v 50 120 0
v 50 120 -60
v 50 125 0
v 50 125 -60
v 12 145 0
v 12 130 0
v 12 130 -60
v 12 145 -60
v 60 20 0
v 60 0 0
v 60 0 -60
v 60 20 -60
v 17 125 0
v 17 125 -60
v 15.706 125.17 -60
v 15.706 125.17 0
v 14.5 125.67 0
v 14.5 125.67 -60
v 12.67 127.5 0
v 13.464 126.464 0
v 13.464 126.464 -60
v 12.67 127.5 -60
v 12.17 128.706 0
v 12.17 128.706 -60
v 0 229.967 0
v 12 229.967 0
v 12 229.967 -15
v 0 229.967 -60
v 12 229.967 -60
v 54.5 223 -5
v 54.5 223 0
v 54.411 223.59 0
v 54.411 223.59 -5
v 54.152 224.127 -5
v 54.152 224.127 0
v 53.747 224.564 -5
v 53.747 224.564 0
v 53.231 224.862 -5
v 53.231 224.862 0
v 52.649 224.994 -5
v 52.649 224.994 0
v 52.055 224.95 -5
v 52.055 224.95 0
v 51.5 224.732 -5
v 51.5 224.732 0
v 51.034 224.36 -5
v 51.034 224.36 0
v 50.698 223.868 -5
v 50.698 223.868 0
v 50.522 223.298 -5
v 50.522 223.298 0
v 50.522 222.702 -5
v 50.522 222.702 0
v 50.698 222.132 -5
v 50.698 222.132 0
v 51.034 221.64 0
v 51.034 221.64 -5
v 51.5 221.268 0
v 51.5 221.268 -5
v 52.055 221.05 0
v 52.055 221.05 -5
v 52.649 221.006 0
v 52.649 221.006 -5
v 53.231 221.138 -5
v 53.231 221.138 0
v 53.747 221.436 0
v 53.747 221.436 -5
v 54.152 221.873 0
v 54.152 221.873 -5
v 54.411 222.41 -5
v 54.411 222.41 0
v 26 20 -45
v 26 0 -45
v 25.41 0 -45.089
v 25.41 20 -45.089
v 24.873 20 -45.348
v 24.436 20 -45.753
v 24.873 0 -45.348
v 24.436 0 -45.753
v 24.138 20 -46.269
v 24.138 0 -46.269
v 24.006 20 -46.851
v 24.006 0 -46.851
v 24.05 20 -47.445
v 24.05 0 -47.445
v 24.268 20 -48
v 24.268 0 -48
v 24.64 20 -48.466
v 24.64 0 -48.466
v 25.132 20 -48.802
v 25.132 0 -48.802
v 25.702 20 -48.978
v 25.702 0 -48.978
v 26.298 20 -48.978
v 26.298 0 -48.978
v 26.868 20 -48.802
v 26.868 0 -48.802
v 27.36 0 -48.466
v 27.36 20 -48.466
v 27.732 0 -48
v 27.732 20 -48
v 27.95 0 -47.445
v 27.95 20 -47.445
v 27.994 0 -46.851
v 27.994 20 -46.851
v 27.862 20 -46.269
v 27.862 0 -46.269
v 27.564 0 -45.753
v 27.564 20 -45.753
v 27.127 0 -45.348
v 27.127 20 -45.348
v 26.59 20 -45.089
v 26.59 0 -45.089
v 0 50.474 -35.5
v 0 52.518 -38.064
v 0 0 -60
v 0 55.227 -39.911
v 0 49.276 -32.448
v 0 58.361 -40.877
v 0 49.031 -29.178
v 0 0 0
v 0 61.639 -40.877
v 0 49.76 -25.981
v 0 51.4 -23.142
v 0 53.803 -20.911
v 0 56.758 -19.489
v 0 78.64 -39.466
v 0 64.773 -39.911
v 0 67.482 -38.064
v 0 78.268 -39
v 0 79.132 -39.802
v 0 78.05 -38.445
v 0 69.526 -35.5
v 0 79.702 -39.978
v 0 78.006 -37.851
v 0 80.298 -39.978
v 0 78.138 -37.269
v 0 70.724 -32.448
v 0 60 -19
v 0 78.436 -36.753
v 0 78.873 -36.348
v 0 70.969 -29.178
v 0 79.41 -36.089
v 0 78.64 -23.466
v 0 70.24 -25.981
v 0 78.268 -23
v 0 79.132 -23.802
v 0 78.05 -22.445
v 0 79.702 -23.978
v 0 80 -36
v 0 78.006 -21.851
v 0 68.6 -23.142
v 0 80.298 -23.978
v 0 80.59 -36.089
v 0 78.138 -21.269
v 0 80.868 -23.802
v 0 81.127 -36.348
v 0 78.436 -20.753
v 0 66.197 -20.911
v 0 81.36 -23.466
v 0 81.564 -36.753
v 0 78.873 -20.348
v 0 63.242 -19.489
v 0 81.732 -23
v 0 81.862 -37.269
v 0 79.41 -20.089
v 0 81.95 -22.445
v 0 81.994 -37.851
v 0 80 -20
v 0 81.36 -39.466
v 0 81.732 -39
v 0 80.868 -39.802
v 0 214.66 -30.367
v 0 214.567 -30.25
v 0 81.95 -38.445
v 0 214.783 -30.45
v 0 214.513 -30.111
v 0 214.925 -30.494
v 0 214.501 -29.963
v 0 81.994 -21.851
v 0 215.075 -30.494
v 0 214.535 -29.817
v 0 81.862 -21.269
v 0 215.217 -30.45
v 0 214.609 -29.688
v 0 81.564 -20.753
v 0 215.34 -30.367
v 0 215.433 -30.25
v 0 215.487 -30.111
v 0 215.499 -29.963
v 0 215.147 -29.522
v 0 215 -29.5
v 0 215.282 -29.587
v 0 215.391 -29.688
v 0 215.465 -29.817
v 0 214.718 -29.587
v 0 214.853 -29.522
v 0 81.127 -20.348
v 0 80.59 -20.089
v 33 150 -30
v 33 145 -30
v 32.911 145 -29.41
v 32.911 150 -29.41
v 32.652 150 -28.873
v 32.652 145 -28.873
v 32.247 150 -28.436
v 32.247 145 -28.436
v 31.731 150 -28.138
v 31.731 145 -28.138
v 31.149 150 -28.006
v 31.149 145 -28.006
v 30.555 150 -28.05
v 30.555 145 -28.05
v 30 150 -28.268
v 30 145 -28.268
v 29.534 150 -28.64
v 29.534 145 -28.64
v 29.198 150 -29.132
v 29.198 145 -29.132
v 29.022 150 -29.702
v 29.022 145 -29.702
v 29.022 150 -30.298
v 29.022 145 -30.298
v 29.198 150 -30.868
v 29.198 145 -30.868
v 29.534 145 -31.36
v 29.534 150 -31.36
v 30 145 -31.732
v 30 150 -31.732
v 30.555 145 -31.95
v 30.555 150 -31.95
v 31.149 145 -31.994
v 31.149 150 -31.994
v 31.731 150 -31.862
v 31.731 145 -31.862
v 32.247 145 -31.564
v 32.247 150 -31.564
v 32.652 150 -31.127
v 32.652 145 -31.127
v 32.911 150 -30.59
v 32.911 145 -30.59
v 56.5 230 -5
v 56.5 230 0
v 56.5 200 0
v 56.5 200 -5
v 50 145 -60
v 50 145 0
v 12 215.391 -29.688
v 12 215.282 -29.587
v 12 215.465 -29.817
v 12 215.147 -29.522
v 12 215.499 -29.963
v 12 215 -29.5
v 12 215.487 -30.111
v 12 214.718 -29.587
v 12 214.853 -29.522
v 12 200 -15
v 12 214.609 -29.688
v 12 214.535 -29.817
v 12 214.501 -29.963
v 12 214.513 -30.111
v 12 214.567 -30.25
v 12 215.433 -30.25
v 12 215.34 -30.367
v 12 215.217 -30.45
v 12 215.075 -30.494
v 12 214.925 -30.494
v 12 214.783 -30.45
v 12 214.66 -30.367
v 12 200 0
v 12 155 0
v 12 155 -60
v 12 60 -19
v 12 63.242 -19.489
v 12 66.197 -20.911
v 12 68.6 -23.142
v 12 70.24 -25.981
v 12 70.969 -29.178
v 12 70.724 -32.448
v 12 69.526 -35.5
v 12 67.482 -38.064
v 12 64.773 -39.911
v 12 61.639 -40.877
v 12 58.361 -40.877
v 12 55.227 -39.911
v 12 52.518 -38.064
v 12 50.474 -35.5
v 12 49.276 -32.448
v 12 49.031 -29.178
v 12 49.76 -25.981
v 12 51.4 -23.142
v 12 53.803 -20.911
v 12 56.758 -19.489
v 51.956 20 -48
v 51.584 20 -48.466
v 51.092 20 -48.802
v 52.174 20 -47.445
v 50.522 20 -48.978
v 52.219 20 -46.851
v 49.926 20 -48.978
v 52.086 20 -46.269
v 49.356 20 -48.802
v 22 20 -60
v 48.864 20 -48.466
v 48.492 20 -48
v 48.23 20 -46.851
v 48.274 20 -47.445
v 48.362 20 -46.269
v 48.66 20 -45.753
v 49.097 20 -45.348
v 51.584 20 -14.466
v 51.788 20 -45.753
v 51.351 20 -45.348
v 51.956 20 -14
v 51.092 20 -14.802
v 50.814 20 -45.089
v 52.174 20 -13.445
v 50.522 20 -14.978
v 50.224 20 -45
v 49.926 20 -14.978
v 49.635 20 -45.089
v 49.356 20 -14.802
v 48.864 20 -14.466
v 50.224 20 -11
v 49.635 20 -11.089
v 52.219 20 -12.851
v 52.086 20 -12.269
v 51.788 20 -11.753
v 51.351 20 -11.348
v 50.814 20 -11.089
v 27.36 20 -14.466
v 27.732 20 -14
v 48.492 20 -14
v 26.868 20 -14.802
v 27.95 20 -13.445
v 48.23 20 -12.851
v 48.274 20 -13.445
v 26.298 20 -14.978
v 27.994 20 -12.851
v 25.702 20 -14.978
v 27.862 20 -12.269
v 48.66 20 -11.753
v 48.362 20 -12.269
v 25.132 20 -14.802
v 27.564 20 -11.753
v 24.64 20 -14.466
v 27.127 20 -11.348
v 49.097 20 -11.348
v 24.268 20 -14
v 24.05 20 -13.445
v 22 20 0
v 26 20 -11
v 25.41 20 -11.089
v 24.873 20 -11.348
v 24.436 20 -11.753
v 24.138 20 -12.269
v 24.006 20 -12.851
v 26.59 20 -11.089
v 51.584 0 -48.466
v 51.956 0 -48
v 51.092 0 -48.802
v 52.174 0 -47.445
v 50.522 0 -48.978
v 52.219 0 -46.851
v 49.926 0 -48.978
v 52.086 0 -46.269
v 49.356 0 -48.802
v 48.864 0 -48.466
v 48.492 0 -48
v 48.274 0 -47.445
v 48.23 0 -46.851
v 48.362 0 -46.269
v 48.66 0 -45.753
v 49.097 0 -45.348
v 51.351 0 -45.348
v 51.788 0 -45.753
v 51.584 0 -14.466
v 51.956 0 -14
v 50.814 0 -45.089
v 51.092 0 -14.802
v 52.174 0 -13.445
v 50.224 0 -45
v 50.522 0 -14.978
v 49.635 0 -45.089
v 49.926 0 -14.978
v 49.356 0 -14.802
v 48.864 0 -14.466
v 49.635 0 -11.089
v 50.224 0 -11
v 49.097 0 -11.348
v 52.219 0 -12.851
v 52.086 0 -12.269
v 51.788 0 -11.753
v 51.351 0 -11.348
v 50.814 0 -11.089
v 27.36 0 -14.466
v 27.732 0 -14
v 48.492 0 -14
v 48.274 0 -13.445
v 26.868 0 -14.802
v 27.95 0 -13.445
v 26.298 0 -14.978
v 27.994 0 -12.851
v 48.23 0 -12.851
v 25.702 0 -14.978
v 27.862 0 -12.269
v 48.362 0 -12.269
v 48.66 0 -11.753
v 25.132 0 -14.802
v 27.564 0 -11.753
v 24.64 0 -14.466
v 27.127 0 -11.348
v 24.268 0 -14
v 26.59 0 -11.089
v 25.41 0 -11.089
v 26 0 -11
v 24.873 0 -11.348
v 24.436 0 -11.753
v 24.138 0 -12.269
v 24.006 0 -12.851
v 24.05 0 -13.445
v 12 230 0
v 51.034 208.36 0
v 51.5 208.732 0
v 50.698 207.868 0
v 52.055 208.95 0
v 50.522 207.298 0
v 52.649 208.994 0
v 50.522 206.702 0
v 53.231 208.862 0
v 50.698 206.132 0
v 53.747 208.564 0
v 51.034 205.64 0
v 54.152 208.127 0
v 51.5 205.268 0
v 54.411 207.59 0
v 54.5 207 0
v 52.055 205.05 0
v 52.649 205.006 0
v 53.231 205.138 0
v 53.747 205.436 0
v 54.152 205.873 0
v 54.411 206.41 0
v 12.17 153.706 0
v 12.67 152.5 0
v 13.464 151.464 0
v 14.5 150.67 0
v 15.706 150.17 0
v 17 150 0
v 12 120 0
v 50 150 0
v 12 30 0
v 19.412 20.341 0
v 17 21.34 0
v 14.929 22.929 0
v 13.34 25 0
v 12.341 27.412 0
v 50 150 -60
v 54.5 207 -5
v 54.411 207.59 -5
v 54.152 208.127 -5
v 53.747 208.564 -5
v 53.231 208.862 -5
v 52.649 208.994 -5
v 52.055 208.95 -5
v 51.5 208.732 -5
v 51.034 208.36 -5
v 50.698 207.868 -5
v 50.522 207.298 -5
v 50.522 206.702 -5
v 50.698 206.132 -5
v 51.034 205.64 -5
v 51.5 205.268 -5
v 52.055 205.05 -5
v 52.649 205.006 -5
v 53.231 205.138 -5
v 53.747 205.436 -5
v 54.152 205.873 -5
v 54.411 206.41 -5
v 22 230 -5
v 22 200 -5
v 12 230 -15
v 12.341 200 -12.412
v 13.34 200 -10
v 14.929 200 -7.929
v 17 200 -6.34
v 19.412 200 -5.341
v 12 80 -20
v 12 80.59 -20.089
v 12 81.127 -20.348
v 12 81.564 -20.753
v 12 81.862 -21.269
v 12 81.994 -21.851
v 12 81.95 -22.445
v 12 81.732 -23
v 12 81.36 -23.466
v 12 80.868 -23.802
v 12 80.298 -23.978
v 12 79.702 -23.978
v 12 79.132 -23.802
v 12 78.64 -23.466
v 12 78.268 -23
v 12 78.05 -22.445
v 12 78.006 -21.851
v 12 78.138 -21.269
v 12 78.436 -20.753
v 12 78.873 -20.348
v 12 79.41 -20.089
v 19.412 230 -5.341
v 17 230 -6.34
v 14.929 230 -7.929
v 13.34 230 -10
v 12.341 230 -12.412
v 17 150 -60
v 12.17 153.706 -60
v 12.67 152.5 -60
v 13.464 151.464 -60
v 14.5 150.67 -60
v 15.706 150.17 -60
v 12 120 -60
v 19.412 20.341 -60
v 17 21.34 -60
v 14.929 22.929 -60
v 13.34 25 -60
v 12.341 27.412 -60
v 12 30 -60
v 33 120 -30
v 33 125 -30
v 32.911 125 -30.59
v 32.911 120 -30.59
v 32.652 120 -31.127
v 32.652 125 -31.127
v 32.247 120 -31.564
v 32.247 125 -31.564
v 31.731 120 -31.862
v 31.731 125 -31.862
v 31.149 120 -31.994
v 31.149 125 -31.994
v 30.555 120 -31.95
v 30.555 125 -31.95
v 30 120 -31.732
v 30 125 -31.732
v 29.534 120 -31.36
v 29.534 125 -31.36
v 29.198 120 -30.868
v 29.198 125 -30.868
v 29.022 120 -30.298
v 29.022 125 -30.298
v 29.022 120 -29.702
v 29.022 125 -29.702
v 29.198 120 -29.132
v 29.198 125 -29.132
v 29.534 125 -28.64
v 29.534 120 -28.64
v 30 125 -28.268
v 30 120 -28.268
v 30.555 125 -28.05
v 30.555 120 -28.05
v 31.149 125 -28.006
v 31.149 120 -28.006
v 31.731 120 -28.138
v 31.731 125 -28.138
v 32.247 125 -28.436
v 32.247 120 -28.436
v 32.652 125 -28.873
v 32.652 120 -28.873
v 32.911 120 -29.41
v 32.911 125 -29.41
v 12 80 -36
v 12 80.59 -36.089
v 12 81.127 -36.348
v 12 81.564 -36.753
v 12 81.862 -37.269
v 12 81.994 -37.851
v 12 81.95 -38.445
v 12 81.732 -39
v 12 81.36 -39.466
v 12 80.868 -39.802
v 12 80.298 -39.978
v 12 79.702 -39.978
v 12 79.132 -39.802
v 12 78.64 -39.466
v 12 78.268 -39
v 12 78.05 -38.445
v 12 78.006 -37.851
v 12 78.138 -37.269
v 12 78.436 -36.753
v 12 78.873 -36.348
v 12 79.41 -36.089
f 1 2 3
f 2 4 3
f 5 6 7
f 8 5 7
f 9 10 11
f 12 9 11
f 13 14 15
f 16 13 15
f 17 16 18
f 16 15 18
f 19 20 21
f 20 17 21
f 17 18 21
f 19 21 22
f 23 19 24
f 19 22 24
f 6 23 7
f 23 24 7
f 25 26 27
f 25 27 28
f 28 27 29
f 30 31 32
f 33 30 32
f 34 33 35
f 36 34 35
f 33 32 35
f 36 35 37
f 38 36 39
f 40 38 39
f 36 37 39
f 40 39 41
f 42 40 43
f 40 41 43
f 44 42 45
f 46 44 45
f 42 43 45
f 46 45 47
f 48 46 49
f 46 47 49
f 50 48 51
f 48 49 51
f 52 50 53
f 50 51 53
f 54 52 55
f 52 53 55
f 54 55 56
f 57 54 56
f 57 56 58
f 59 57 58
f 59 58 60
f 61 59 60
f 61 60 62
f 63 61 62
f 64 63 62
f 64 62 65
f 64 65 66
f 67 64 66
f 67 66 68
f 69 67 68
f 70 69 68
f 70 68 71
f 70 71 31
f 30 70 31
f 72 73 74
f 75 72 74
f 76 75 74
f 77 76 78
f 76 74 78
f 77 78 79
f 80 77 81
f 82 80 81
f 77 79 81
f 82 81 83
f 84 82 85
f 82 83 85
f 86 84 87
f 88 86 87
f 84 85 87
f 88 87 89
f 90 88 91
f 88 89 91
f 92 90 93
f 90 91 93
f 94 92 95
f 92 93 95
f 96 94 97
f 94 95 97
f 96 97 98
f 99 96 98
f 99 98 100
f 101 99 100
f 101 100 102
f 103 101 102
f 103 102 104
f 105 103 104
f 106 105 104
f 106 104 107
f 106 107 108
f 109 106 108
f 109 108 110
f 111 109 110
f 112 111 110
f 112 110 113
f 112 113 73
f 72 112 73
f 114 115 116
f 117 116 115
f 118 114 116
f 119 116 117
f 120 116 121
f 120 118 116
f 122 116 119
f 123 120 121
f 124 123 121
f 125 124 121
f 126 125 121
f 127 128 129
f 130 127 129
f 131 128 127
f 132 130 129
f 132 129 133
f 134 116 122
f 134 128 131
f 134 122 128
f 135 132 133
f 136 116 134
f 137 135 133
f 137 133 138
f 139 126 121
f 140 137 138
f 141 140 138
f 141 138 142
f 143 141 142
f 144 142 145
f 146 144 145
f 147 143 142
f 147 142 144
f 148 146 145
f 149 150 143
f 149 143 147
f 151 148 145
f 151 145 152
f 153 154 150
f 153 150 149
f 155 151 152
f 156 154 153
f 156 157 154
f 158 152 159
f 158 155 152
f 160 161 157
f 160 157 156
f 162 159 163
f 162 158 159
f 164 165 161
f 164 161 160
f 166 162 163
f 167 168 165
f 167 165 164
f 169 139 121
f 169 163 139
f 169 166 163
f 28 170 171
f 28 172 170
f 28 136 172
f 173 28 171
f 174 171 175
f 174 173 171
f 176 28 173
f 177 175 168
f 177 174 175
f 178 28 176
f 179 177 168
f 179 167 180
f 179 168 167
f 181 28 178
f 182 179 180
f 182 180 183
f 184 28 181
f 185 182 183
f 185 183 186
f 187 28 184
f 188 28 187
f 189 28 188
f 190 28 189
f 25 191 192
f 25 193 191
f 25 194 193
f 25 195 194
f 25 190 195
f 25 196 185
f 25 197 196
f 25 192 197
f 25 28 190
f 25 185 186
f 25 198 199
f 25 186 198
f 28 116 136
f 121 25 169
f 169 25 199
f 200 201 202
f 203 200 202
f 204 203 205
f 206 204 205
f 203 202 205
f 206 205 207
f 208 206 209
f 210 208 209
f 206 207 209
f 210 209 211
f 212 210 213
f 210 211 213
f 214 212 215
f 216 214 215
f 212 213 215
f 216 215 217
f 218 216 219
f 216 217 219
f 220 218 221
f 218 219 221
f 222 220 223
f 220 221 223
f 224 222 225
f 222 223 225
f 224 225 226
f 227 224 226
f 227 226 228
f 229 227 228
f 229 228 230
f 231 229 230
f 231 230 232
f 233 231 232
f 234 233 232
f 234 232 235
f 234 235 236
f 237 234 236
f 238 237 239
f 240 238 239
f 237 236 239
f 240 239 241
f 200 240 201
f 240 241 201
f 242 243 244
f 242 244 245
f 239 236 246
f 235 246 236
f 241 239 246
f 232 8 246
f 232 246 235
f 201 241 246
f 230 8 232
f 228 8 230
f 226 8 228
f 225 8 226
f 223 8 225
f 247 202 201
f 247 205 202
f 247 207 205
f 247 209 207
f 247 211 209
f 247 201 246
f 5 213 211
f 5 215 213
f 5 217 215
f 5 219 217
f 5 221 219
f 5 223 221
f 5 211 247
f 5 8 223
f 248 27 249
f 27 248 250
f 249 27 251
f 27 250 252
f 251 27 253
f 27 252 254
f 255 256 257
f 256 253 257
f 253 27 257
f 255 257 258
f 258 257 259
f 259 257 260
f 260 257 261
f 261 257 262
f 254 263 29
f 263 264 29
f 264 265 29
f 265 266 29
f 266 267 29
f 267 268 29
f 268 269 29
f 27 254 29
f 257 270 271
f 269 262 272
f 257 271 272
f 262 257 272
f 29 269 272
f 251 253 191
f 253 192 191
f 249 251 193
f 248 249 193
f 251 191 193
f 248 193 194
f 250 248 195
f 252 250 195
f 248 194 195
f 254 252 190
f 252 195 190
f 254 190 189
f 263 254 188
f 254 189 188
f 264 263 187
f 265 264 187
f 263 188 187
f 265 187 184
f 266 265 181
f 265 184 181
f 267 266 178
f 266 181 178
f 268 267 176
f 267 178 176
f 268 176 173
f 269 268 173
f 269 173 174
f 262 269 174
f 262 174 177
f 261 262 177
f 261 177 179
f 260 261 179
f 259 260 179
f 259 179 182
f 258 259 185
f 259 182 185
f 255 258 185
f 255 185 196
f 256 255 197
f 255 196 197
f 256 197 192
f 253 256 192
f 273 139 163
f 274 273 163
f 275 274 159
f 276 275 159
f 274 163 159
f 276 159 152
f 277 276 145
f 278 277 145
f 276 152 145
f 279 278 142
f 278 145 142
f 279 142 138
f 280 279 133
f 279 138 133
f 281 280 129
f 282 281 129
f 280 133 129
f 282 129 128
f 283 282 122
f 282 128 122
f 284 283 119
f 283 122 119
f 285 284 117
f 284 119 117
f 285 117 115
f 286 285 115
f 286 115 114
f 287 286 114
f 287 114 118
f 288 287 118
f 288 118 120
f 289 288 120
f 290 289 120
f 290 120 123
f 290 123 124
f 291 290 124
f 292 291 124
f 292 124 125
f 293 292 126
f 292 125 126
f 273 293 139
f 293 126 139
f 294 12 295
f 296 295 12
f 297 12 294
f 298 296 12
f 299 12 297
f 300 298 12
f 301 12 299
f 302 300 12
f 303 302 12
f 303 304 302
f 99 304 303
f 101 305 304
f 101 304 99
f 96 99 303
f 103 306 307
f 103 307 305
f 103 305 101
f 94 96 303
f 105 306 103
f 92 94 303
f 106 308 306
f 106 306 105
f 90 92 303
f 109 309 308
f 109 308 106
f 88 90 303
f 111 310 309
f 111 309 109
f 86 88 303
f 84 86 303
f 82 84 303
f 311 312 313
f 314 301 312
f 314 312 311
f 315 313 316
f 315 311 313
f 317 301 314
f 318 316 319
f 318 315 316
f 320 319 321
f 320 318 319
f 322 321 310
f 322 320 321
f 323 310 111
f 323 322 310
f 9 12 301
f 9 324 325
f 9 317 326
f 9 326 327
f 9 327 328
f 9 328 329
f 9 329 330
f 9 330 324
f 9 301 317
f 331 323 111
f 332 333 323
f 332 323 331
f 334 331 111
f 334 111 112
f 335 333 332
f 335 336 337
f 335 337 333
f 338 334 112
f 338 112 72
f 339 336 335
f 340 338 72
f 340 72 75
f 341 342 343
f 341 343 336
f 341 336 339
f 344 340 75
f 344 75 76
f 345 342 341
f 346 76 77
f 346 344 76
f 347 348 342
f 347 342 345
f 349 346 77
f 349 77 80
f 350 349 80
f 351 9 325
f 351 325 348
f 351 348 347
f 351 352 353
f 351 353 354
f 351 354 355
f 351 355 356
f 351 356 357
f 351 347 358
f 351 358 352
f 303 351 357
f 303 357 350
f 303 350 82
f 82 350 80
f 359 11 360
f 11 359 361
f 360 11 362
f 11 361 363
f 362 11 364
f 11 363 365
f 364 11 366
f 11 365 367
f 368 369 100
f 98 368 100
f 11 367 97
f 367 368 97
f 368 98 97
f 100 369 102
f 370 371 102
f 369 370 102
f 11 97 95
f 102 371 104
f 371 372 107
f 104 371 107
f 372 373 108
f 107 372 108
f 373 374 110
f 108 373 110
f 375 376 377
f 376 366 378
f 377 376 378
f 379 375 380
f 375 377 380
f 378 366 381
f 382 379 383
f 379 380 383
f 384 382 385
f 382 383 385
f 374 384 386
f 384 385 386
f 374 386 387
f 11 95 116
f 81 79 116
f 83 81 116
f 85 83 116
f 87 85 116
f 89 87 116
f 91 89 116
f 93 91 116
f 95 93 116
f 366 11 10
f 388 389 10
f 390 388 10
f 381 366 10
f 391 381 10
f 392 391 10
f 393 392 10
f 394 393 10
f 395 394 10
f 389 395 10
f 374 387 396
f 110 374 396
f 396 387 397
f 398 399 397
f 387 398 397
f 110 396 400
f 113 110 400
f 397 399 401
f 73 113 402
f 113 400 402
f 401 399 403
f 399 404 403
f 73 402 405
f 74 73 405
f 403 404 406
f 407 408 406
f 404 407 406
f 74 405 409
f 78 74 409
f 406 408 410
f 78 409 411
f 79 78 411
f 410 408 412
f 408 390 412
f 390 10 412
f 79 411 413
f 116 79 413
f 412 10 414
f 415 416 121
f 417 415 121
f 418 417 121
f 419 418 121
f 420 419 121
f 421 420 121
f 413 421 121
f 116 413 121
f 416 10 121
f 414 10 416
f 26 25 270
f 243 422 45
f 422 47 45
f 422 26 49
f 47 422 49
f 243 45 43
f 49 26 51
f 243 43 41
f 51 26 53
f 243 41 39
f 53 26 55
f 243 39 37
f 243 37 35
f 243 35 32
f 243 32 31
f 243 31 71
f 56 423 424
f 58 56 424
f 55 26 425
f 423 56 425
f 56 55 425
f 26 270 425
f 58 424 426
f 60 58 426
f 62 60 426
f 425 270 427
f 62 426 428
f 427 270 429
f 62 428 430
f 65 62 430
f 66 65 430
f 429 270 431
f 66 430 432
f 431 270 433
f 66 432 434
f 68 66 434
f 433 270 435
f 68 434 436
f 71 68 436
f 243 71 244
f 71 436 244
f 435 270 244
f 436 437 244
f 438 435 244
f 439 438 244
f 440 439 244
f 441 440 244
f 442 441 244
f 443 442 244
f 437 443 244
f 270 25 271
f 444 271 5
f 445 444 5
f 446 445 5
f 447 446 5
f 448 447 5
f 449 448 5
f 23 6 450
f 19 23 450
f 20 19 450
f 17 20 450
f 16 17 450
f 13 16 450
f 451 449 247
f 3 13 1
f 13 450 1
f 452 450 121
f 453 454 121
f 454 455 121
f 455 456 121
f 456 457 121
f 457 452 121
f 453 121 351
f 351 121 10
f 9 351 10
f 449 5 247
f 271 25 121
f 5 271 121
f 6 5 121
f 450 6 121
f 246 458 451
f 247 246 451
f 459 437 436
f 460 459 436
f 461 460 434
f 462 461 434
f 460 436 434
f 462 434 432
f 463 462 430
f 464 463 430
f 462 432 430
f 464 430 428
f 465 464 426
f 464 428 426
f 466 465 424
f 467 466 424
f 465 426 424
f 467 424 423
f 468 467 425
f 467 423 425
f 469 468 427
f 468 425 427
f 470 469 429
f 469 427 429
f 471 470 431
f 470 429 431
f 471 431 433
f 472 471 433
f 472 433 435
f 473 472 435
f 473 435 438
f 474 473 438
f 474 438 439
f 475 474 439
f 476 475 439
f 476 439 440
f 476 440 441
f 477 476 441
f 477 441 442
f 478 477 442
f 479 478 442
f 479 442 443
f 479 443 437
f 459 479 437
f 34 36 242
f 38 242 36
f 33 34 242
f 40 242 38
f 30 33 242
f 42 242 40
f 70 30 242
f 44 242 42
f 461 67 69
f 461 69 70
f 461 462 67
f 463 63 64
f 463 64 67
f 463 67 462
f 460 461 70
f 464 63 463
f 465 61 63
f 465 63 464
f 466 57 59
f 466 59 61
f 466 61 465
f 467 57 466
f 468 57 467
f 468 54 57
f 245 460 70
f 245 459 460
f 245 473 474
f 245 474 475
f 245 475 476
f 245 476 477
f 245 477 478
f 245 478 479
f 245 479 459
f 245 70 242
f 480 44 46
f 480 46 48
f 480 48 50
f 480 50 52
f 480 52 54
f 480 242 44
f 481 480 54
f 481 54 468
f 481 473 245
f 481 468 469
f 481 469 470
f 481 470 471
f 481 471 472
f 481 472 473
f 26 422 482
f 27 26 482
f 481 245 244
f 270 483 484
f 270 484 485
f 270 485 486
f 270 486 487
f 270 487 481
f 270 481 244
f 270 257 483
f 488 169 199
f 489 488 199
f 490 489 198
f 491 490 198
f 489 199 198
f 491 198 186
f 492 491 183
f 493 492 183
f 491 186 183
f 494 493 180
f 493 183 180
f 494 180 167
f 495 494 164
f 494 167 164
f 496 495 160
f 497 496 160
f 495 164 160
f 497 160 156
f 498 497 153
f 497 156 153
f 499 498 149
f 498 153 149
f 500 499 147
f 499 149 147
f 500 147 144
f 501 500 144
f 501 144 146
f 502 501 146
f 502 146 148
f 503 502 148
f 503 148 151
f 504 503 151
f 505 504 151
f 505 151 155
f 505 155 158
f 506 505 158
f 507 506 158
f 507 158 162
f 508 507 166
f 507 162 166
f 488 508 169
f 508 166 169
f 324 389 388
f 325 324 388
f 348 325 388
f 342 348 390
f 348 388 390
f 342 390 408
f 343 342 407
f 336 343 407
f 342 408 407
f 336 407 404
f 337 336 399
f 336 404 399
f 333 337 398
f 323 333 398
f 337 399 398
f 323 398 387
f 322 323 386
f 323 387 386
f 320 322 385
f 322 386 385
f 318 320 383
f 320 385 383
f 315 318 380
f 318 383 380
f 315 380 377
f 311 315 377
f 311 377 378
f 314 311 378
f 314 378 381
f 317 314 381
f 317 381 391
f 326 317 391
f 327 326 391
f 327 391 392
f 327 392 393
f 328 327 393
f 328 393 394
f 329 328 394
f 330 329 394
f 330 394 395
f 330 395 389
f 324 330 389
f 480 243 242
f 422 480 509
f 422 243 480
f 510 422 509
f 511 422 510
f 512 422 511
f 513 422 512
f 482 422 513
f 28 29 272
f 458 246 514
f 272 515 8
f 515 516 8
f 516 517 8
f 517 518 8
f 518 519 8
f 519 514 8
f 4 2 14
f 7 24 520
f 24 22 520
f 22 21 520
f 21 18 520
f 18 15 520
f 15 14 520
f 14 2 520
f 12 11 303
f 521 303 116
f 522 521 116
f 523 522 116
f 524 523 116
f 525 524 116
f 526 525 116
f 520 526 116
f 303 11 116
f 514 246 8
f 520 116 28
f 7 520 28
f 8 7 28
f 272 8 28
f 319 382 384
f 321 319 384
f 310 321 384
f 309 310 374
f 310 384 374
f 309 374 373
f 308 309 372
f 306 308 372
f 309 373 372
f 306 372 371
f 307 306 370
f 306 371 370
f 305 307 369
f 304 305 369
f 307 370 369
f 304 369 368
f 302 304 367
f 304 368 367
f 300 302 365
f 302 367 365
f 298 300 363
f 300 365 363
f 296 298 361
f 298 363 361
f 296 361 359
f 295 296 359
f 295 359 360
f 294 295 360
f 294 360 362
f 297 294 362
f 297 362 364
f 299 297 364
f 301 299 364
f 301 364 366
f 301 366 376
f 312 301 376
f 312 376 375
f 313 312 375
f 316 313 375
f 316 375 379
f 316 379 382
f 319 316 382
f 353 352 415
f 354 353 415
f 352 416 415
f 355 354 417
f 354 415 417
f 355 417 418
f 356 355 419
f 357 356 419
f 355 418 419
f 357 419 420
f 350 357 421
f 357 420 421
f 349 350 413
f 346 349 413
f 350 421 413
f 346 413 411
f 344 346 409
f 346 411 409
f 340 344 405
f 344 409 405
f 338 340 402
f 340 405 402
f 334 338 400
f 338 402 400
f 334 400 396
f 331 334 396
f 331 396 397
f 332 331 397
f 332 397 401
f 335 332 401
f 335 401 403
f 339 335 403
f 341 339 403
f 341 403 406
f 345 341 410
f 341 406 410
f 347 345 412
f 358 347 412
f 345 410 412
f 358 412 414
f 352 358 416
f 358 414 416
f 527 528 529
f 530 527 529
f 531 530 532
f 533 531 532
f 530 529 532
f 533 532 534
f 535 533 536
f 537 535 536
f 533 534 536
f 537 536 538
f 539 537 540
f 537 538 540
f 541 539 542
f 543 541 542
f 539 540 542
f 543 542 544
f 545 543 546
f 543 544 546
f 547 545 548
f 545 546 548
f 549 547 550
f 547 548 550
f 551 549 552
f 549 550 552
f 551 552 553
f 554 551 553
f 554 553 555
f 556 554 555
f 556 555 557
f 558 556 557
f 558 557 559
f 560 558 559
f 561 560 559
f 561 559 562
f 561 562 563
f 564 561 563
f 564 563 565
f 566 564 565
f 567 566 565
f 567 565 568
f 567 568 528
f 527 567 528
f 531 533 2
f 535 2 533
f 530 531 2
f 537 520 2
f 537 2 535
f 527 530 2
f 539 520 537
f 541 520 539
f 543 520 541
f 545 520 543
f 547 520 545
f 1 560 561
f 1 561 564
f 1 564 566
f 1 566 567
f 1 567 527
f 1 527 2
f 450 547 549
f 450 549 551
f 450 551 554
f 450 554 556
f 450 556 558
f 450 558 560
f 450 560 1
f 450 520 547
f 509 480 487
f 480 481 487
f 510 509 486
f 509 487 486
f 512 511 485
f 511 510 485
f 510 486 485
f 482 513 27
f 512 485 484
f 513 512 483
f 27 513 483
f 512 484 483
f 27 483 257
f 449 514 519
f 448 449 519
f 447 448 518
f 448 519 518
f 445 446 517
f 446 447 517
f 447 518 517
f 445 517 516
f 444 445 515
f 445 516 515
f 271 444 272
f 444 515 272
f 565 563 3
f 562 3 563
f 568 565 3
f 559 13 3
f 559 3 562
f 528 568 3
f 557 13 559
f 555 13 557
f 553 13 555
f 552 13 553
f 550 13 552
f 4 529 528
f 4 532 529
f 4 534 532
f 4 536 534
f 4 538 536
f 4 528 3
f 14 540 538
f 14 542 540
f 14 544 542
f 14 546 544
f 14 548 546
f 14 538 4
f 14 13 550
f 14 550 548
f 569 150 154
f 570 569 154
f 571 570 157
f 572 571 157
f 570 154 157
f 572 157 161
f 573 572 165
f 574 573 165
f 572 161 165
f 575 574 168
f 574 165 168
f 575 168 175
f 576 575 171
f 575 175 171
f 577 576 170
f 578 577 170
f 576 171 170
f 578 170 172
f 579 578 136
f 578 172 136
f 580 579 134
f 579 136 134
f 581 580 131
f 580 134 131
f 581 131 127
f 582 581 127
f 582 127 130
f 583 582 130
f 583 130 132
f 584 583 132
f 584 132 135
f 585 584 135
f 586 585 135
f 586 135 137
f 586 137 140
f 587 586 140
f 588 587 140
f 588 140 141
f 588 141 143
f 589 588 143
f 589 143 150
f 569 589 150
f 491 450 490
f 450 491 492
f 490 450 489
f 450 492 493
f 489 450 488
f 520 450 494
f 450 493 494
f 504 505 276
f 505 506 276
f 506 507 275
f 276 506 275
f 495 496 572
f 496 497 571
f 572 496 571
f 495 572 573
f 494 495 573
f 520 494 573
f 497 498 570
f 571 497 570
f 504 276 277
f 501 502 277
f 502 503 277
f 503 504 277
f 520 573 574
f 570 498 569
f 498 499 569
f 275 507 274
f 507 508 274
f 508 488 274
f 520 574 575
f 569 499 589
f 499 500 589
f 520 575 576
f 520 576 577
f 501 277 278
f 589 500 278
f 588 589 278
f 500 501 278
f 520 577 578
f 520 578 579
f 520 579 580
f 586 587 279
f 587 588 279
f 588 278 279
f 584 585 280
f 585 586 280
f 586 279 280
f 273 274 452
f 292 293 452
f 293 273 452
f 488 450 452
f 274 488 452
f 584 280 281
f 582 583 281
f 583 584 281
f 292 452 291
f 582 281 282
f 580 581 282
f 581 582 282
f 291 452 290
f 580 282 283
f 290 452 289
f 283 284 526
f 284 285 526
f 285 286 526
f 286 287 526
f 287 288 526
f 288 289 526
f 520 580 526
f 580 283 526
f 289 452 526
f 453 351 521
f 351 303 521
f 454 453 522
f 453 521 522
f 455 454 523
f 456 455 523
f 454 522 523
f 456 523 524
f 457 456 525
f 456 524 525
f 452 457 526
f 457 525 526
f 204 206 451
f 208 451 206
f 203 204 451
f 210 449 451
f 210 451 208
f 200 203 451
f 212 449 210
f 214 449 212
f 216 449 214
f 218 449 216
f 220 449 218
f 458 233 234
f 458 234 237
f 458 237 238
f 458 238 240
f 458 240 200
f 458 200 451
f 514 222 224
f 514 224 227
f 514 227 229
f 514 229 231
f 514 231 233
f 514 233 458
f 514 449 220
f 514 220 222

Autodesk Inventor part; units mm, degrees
ref_plane "YZ Plane" through (0, 0, 0) normal (1, 0, 0) x (0, 1, 0)
ref_plane "XZ Plane" through (0, 0, 0) normal (0, 1, 0) x (-1, 0, 0)
ref_plane "XY Plane" through (0, 0, 0) normal (0, 0, 1) x (1, 0, 0)
sketch "Эскиз1" plane through (0, 0, 0) normal (0, 1, 0) x (-1, 0, 0)
  line L0 (0, 0) -> (-60, 0)
  line L1 (-60, 0) -> (-60, -60)
  line L2 (-60, -60) -> (0, -60)
  line L3 (0, -60) -> (0, 0)
  dimension "d0" = 60
  dimension "d1" = 60
extrude "Выдавливание1" add sketch "Эскиз1" along normal blind 20
sketch "Эскиз2" plane through (0, 20, 0) normal (0, 1, 0) x (1, 0, 0)
  line L0 (0, 0) -> (60, 0) projected
  line L1 (0, 0) -> (12, 0)
  line L2 (12, 0) -> (12, 60)
  line L3 (60, 60) -> (0, 60) projected
  line L4 (0, 60) -> (0, 0) projected
  line L5 (0, 60) -> (0, 0)
  dimension "d4" = 12
extrude "Выдавливание2" add sketch "Эскиз2" along normal blind 260
sketch "Эскиз3" plane through (0, 20, 0) normal (0, 1, 0) x (1, 0, 0)
  point P0 (0, 0)
  point P1 (26, 13)
  point P2 (26, 47)
  point P3 (50.2241, 13)
  point P4 (50.2241, 47)
hole "Отверстие1" at (26, 20, -13) at (26, 20, -47) at (50.2241, 20, -13) at (50.2241, 20, -47) direction (0, -1, 0) diameter 4 depth 40 tip angle 118
sketch "Эскиз4" plane through (12, 20, 0) normal (1, 0, 0) x (0, 0, -1)
  point P0 (0, -20)
  point P1 (30, 88)
  dimension "d14" = 0
extrude "Выдавливание3" [suppressed]
sketch "Эскиз5" plane through (12, 20, 0) normal (1, 0, 0) x (0, 0, -1)
  point P0 (0, -20)
sketch "Эскиз6" plane through (0, 0, 0) normal (0, 0, 1) x (1, 0, 0)
  line L0 (0, 0) -> (0, 280) projected
  line L1 (12, 20) -> (12, 280) projected
sketch "Эскиз7" plane through (60, 0, -60) normal (0, 0, -1) x (-1, 0, 0)
  point P0 (60, 0)
sketch "Эскиз8" plane through (12, 20, 0) normal (1, 0, 0) x (0, 0, -1)
  circle A0 centre (30, 80) radius 11.5
  point P0 (0, -20)
  point P1 (0, 80)
  dimension "d17" = 23
extrude "Выдавливание4" cut sketch "Эскиз8" against normal blind 100
sketch "Эскиз9" plane through (0, 0, -60) normal (-1, 0, 0) x (0, 0, 1)
  circle A0 centre (29.731, 99.8395) radius 12.5286
  point P0 (60, 0)
  point P1 (0, 80)
extrude "Выдавливание5" add sketch "Эскиз9" against normal blind 12
sketch "Эскиз10" plane through (0, 0, -60) normal (-1, 0, 0) x (0, 0, 1)
  line L0 (0, 0) -> (0, 280) projected
  circle A0 centre (30, 60) radius 11
  circle A1 centre (22, 80) radius 2
  circle A2 centre (38, 80) radius 2
  point P0 (60, 0)
  point P1 (0, 60)
  point P2 (0, 80)
  point P3 (30, 80)
  dimension "d22" = 22
  dimension "d23" = 4
  dimension "d24" = 4
extrude "Выдавливание6" cut sketch "Эскиз10" against normal blind 12
sketch "Эскиз11" plane through (0, 0, 0) normal (0, -1, 0) x (1, 0, 0)
  point P0 (0, 0)
fillet "Сопряжение1" radius 10 1 edges at (12, 20, -30)
sketch "Эскиз12" plane through (0, 0, -60) normal (-1, 0, 0) x (0, 0, 1)
  line L0 (0, 120) -> (60, 120)
  line L1 (60, 120) -> (60, 125)
  line L2 (60, 125) -> (0, 125)
  line L3 (0, 125) -> (0, 120)
  point P0 (60, 0)
  dimension "d28" = 60
  dimension "d29" = 5
extrude "Выдавливание7" add sketch "Эскиз12" against normal blind 50
fillet "Сопряжение2" radius 5 1 edges at (12, 125, -30)
sketch "Эскиз13" plane through (50, 125, 0) normal (0, 1, 0) x (1, 0, 0)
  circle A0 centre (-19, 30) radius 2
  point P0 (-50, 0)
  dimension "d33" = 4
extrude "Выдавливание8" cut sketch "Эскиз13" against normal blind 50
sketch "Эскиз14" plane through (0, 0, -60) normal (-1, 0, 0) x (0, 0, 1)
  line L0 (0, 0) -> (0, 280) projected
  line L1 (0, 145) -> (60, 145)
  line L2 (60, 145) -> (60, 150)
  line L3 (60, 150) -> (0, 150)
  line L4 (0, 150) -> (0, 145)
  point P0 (60, 0)
  dimension "d36" = 60
  dimension "d37" = 5
extrude "Выдавливание9" add sketch "Эскиз14" against normal blind 50
fillet "Сопряжение3" radius 5 1 edges at (12, 150, -30)
sketch "Эскиз15" plane through (12, 145, -60) normal (0, -1, 0) x (1, 0, 0)
  circle A0 centre (19, 30) radius 2 projected
  circle A1 centre (19, 30) radius 2
  circle A2 centre (19, 30) radius 2
  point P0 (-12, 60)
  point P1 (3.4297, 11.4015)
  dimension "d41" = 4
extrude "Выдавливание10" cut sketch "Эскиз15" against normal blind 50
sketch "Эскиз16" plane through (0, 0, -60) normal (-1, 0, 0) x (0, 0, 1)
  line L0 (0, 0) -> (0, 280) projected
  circle A0 centre (30, 215) radius 0.5
  point P0 (60, 0)
  point P1 (0, 215)
  point P2 (0, 215)
  dimension "d44" = 1
extrude "Выдавливание11" cut sketch "Эскиз16" against normal blind 100
sketch "Эскиз17" plane through (12, 280, 0) normal (1, 0, 0) x (0, 0, -1)
  point P0 (0, -280)
sketch "Эскиз18" plane through (12, 280, 0) normal (1, 0, 0) x (0, 0, -1)
  line L0 (0, -125) -> (0, 0) projected
  line L1 (60, -280) -> (60, 0) projected
  line L2 (0, -80) -> (0, -50)
  line L3 (0, -50) -> (5, -50)
  line L4 (5, -50) -> (5, -80)
  line L5 (5, -80) -> (0, -80)
  line L6 (0, -80) -> (0, -50)
  point P0 (0, -280)
  point P1 (30, -80)
  point P2 (30, -50)
  dimension "d47" = 5
extrude "Выдавливание12" add sketch "Эскиз18" along normal blind 44.5
sketch "Эскиз19" plane through (0, 0, 0) normal (0, 0, 1) x (1, 0, 0)
  circle A0 centre (52.5, 223) radius 2
  circle A1 centre (52.5, 207) radius 2
  point P0 (0, 0)
  point P1 (52.5, 215)
  dimension "d50" = 4
  dimension "d51" = 4
extrude "Выдавливание13" cut sketch "Эскиз19" against normal blind 45
fillet "Сопряжение4" radius 10 1 edges at (12, 215, -5)
sketch "Эскиз20" plane through (12, 280, 0) normal (1, 0, 0) x (0, 0, -1)
  line L0 (0, -280) -> (0, 0) projected
  line L1 (0, -50.033) -> (60, -50.033)
  line L2 (60, -280) -> (60, 0) projected
  line L3 (60, -50.033) -> (60, 0)
  line L4 (60, 0) -> (0, 0)
  line L5 (0, 0) -> (0, -50.033)
extrude "Выдавливание14" cut sketch "Эскиз20" against normal blind 100
properties part number "Подпора"
